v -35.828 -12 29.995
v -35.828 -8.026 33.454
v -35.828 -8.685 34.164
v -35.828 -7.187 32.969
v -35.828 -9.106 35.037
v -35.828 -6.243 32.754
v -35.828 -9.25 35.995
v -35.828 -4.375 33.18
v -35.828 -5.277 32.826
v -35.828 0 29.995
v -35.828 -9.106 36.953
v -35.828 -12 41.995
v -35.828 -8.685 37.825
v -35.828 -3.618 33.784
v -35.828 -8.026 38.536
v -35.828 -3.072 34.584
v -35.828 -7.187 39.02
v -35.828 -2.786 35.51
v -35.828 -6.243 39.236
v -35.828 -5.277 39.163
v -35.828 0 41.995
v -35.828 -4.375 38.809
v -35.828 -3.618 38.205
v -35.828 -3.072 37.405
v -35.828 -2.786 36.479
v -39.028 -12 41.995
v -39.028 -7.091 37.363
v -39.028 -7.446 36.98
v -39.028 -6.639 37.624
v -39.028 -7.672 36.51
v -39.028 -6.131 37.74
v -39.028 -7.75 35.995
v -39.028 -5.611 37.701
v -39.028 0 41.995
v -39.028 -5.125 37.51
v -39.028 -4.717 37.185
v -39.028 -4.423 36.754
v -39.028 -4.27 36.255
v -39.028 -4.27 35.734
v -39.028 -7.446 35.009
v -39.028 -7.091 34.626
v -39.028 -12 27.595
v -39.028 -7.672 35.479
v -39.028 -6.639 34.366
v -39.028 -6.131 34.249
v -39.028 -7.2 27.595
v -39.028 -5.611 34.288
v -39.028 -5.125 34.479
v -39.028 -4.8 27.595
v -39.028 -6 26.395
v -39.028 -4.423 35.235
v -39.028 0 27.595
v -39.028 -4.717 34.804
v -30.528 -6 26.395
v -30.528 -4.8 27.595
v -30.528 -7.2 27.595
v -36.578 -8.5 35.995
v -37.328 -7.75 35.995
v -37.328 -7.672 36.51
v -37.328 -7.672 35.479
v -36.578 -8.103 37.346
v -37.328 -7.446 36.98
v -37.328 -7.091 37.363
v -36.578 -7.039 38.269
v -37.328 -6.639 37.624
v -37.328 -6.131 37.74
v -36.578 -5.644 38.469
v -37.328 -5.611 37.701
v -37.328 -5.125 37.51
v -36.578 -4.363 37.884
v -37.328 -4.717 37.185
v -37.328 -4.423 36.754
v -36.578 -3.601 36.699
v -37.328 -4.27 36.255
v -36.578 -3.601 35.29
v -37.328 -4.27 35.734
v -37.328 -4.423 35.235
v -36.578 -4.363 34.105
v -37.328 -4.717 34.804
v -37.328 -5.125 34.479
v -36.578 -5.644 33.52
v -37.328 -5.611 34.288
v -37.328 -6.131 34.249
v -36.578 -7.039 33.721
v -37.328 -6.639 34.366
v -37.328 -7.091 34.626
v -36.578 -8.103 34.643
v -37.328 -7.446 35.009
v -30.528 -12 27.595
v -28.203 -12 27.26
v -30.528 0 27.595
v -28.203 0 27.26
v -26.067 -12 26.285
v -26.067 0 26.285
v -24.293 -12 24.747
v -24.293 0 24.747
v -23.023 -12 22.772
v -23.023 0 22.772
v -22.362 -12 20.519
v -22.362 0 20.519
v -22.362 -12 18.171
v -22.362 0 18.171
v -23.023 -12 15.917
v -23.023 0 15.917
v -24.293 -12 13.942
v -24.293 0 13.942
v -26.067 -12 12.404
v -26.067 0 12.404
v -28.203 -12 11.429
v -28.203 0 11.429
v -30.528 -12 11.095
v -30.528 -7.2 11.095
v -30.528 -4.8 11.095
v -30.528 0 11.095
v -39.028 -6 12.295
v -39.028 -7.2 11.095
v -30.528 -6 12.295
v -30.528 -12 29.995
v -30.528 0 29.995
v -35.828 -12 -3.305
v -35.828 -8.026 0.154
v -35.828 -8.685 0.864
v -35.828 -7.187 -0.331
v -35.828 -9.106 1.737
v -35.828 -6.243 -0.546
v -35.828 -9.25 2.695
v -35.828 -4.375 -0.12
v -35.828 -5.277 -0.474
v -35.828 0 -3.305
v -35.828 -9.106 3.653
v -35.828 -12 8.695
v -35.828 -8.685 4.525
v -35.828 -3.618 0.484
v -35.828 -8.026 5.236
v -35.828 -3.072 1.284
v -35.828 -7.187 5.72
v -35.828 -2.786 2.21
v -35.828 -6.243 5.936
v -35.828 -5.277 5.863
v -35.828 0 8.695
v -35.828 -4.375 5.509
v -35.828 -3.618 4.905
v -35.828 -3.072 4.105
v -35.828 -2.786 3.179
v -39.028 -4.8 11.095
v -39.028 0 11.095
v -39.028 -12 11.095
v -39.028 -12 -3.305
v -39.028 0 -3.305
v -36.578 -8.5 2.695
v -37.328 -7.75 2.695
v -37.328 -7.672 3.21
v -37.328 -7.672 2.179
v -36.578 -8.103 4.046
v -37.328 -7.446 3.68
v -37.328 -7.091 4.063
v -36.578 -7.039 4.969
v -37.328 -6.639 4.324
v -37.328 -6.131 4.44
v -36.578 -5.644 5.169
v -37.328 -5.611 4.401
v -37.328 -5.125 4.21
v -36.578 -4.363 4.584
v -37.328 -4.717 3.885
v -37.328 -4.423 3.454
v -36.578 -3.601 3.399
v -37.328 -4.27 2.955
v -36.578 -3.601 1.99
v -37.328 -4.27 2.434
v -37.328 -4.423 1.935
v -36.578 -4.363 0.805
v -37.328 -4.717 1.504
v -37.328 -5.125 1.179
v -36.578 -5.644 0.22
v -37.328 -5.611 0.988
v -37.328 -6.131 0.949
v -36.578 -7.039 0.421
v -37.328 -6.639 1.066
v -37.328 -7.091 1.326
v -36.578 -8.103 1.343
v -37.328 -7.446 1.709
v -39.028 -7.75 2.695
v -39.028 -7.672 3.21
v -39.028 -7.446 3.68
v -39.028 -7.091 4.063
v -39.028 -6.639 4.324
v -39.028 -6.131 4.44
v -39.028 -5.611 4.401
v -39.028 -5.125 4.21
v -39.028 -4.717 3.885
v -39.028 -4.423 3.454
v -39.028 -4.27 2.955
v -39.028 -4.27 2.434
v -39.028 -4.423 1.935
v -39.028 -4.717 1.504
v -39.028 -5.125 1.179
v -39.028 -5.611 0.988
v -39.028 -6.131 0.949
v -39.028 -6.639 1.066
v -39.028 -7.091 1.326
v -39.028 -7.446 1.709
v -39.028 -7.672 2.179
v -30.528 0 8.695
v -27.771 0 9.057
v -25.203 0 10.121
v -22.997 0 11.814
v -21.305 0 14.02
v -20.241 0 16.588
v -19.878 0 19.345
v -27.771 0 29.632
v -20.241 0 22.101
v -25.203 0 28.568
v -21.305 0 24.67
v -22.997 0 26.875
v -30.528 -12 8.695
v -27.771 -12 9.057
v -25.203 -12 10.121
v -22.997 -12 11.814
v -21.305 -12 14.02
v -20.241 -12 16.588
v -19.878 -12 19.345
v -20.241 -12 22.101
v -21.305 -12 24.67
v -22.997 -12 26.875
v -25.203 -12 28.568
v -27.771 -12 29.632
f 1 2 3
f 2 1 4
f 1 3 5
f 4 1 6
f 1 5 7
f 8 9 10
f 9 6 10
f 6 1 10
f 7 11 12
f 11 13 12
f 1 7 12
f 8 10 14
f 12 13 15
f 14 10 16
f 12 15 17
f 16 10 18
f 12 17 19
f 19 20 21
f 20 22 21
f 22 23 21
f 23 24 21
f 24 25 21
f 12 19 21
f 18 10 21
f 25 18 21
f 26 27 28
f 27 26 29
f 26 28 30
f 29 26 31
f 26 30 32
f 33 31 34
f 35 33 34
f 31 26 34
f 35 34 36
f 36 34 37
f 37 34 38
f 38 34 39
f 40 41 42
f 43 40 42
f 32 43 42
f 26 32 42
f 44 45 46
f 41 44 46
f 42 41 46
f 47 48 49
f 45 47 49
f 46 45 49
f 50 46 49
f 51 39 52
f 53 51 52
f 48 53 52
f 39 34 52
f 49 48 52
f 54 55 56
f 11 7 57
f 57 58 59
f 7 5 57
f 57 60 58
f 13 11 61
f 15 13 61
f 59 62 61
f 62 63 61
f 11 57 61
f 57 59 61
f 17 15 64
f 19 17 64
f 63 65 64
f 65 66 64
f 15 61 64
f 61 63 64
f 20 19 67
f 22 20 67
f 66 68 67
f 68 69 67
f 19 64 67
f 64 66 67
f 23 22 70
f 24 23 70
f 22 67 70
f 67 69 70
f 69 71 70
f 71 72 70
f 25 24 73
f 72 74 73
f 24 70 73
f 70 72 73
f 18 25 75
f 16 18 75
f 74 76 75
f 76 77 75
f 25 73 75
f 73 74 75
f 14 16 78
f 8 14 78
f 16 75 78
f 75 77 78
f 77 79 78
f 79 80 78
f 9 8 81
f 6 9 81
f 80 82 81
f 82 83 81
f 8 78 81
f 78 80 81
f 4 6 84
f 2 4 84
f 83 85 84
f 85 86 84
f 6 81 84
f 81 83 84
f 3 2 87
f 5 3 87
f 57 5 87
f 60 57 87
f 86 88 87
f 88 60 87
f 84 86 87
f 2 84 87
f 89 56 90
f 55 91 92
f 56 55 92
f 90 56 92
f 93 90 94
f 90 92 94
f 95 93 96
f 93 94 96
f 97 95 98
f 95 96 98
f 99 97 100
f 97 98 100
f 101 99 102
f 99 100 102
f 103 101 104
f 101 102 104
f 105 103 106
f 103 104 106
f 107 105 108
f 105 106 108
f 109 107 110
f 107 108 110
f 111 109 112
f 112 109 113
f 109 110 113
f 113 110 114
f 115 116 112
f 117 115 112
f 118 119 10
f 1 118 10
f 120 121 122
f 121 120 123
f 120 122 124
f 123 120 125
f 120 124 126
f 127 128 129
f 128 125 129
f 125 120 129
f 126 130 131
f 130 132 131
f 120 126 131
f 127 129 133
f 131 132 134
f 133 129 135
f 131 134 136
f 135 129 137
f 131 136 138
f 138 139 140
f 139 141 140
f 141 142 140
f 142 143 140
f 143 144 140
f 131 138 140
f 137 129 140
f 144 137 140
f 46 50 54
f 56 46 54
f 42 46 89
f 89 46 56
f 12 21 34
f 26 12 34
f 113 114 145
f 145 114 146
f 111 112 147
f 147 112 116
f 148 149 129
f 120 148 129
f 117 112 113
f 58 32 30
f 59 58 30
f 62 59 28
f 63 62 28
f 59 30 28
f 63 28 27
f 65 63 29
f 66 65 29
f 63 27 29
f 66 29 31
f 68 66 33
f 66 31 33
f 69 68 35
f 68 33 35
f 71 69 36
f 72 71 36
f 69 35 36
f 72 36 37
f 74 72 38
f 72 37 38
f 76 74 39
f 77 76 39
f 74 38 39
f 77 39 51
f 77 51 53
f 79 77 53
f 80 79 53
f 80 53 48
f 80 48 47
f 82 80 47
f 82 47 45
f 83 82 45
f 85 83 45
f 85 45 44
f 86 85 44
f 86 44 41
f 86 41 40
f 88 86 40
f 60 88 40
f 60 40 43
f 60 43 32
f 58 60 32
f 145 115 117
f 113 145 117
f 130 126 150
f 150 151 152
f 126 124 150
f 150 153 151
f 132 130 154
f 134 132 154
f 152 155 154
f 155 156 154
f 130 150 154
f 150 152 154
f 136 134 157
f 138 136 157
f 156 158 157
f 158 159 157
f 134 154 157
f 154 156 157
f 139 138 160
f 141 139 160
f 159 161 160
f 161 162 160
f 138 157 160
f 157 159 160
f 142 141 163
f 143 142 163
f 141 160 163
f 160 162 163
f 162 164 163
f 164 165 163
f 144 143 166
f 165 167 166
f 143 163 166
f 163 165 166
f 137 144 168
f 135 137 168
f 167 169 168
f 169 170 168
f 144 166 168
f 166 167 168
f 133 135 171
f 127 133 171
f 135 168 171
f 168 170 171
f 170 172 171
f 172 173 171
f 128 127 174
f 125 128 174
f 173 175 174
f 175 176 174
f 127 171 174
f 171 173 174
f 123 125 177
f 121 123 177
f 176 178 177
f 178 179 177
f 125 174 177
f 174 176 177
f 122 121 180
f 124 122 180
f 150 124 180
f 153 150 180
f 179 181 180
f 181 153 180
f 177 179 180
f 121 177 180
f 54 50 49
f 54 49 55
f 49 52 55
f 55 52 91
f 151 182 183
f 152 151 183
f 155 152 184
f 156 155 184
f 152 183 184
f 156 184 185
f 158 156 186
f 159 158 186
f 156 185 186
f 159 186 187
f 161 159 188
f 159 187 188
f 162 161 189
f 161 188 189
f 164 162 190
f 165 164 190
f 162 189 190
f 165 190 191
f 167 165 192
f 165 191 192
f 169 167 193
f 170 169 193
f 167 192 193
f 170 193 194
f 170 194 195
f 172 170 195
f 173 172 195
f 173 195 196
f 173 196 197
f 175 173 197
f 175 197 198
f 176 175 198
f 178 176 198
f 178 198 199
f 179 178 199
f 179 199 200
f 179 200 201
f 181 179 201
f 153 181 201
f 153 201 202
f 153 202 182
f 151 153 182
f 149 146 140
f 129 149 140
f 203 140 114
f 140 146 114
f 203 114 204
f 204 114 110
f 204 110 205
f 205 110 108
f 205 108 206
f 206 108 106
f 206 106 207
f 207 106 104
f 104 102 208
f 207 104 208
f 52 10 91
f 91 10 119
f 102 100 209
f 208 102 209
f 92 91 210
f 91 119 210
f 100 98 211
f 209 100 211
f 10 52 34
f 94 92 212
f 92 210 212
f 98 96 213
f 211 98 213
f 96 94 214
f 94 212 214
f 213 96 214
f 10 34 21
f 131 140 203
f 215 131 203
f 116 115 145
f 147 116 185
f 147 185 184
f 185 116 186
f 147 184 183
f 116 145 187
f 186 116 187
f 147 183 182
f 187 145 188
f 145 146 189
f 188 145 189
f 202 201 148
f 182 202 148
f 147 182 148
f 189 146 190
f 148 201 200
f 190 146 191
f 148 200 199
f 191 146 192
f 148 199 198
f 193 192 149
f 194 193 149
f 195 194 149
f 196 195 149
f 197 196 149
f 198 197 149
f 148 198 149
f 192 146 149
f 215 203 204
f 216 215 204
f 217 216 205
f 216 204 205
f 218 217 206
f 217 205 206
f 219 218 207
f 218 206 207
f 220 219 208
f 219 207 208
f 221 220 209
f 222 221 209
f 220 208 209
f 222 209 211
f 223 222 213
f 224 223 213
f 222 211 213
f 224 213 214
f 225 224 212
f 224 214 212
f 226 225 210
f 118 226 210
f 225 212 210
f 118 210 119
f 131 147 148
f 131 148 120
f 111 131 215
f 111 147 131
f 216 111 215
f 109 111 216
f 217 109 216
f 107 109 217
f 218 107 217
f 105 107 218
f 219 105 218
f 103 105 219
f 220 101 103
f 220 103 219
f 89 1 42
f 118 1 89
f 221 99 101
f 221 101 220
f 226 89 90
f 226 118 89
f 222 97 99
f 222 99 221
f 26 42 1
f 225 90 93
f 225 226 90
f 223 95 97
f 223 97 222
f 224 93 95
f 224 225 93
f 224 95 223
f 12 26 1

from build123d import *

# Parameters (mm, degrees)
F1_DEPTH = 12
F2_R     = 1.75
F3_DEPTH = 19.151
F4_SIZE  = 1.5
F5_W     = 8.5
F5_H     = 2.4
F6_DEPTH = 1.2
F7_W     = 8.5
F7_H     = 2.4
F8_DEPTH = 1.2
F9_SIZE  = 1.19999


# Not quite as in the source:
# - a fillet or chamfer is up to 0.001 mm smaller than in the source, because OpenCascade refuses the exact size


with BuildPart() as f1:
    # F0 (on Front) → F1 (new body)
    with BuildSketch(Plane.XZ):
        with BuildLine():
            Line((-35.8277369916, 41.9945976296), (-39.0277369916, 41.9945976296))
            Line((-39.0277369916, 41.9945976296), (-39.0277369916, 27.5945976296))
            Line((-39.0277369916, 27.5945976296), (-30.5277369916, 27.5945976296))
            ThreePointArc((-30.5277369916, 27.5945976296), (-22.2777369916, 19.3445976296), (-30.5277369916, 11.0945976296))
            Line((-30.5277369916, 11.0945976296), (-39.0277369916, 11.0945976296))
            Line((-39.0277369916, 11.0945976296), (-39.0277369916, -3.3054023704))
            Line((-39.0277369916, -3.3054023704), (-35.8277369916, -3.3054023704))
            Line((-35.8277369916, -3.3054023704), (-35.8277369916, 8.6945976296))
            Line((-35.8277369916, 8.6945976296), (-30.5277369916, 8.6945976296))
            ThreePointArc((-30.5277369916, 8.6945976296), (-19.8777369916, 19.3445976296), (-30.5277369916, 29.9945976296))
            Line((-30.5277369916, 29.9945976296), (-35.8277369916, 29.9945976296))
            Line((-35.8277369916, 29.9945976296), (-35.8277369916, 41.9945976296))
        make_face()
    extrude(amount=F1_DEPTH)

    # F2 (on face) → F3 (cut, through all)
    with BuildSketch(Plane(origin=(-39.0277369916, 0, 0), x_dir=(0, -1, 0), z_dir=(-1, 0, 0))):
        with Locations((6, 35.9945976296)):
            Circle(F2_R)
        with Locations((6, 2.6945976296)):
            Circle(F2_R)
    extrude(amount=-F3_DEPTH, mode=Mode.SUBTRACT)

    # F4
    f4_edges = [f1.edges().sort_by_distance(p)[0] for p in [
        (-35.827737, -4.25, 35.994598),
        (-35.827737, -4.25, 2.694598),
    ]]
    chamfer(f4_edges, length=F4_SIZE)

    # F5 (on face) → F6 (join)
    with BuildSketch(Plane.XY.offset(11.0945976296)):
        with Locations((-34.7777369916, -6)):
            Rectangle(F5_W, F5_H)
    extrude(amount=F6_DEPTH)

    # F7 (on face) → F8 (join)
    with BuildSketch(Plane(origin=(0, 0, 27.5945976296), x_dir=(1, 0, 0), z_dir=(0, 0, -1))):
        with Locations((-34.7777369916, 6)):
            Rectangle(F7_W, F7_H)
    extrude(amount=F8_DEPTH)

    # F9 (size 1.2 in the source; OpenCascade refuses exactly that, so slightly less here)
    f9_edges = [f1.edges().sort_by_distance(p)[0] for p in [
        (-34.777737, -7.2, 12.294598),
        (-34.777737, -4.8, 12.294598),
        (-34.777737, -7.2, 26.394598),
        (-34.777737, -4.8, 26.394598),
    ]]
    chamfer(f9_edges, length=F9_SIZE)


solid = f1.part
